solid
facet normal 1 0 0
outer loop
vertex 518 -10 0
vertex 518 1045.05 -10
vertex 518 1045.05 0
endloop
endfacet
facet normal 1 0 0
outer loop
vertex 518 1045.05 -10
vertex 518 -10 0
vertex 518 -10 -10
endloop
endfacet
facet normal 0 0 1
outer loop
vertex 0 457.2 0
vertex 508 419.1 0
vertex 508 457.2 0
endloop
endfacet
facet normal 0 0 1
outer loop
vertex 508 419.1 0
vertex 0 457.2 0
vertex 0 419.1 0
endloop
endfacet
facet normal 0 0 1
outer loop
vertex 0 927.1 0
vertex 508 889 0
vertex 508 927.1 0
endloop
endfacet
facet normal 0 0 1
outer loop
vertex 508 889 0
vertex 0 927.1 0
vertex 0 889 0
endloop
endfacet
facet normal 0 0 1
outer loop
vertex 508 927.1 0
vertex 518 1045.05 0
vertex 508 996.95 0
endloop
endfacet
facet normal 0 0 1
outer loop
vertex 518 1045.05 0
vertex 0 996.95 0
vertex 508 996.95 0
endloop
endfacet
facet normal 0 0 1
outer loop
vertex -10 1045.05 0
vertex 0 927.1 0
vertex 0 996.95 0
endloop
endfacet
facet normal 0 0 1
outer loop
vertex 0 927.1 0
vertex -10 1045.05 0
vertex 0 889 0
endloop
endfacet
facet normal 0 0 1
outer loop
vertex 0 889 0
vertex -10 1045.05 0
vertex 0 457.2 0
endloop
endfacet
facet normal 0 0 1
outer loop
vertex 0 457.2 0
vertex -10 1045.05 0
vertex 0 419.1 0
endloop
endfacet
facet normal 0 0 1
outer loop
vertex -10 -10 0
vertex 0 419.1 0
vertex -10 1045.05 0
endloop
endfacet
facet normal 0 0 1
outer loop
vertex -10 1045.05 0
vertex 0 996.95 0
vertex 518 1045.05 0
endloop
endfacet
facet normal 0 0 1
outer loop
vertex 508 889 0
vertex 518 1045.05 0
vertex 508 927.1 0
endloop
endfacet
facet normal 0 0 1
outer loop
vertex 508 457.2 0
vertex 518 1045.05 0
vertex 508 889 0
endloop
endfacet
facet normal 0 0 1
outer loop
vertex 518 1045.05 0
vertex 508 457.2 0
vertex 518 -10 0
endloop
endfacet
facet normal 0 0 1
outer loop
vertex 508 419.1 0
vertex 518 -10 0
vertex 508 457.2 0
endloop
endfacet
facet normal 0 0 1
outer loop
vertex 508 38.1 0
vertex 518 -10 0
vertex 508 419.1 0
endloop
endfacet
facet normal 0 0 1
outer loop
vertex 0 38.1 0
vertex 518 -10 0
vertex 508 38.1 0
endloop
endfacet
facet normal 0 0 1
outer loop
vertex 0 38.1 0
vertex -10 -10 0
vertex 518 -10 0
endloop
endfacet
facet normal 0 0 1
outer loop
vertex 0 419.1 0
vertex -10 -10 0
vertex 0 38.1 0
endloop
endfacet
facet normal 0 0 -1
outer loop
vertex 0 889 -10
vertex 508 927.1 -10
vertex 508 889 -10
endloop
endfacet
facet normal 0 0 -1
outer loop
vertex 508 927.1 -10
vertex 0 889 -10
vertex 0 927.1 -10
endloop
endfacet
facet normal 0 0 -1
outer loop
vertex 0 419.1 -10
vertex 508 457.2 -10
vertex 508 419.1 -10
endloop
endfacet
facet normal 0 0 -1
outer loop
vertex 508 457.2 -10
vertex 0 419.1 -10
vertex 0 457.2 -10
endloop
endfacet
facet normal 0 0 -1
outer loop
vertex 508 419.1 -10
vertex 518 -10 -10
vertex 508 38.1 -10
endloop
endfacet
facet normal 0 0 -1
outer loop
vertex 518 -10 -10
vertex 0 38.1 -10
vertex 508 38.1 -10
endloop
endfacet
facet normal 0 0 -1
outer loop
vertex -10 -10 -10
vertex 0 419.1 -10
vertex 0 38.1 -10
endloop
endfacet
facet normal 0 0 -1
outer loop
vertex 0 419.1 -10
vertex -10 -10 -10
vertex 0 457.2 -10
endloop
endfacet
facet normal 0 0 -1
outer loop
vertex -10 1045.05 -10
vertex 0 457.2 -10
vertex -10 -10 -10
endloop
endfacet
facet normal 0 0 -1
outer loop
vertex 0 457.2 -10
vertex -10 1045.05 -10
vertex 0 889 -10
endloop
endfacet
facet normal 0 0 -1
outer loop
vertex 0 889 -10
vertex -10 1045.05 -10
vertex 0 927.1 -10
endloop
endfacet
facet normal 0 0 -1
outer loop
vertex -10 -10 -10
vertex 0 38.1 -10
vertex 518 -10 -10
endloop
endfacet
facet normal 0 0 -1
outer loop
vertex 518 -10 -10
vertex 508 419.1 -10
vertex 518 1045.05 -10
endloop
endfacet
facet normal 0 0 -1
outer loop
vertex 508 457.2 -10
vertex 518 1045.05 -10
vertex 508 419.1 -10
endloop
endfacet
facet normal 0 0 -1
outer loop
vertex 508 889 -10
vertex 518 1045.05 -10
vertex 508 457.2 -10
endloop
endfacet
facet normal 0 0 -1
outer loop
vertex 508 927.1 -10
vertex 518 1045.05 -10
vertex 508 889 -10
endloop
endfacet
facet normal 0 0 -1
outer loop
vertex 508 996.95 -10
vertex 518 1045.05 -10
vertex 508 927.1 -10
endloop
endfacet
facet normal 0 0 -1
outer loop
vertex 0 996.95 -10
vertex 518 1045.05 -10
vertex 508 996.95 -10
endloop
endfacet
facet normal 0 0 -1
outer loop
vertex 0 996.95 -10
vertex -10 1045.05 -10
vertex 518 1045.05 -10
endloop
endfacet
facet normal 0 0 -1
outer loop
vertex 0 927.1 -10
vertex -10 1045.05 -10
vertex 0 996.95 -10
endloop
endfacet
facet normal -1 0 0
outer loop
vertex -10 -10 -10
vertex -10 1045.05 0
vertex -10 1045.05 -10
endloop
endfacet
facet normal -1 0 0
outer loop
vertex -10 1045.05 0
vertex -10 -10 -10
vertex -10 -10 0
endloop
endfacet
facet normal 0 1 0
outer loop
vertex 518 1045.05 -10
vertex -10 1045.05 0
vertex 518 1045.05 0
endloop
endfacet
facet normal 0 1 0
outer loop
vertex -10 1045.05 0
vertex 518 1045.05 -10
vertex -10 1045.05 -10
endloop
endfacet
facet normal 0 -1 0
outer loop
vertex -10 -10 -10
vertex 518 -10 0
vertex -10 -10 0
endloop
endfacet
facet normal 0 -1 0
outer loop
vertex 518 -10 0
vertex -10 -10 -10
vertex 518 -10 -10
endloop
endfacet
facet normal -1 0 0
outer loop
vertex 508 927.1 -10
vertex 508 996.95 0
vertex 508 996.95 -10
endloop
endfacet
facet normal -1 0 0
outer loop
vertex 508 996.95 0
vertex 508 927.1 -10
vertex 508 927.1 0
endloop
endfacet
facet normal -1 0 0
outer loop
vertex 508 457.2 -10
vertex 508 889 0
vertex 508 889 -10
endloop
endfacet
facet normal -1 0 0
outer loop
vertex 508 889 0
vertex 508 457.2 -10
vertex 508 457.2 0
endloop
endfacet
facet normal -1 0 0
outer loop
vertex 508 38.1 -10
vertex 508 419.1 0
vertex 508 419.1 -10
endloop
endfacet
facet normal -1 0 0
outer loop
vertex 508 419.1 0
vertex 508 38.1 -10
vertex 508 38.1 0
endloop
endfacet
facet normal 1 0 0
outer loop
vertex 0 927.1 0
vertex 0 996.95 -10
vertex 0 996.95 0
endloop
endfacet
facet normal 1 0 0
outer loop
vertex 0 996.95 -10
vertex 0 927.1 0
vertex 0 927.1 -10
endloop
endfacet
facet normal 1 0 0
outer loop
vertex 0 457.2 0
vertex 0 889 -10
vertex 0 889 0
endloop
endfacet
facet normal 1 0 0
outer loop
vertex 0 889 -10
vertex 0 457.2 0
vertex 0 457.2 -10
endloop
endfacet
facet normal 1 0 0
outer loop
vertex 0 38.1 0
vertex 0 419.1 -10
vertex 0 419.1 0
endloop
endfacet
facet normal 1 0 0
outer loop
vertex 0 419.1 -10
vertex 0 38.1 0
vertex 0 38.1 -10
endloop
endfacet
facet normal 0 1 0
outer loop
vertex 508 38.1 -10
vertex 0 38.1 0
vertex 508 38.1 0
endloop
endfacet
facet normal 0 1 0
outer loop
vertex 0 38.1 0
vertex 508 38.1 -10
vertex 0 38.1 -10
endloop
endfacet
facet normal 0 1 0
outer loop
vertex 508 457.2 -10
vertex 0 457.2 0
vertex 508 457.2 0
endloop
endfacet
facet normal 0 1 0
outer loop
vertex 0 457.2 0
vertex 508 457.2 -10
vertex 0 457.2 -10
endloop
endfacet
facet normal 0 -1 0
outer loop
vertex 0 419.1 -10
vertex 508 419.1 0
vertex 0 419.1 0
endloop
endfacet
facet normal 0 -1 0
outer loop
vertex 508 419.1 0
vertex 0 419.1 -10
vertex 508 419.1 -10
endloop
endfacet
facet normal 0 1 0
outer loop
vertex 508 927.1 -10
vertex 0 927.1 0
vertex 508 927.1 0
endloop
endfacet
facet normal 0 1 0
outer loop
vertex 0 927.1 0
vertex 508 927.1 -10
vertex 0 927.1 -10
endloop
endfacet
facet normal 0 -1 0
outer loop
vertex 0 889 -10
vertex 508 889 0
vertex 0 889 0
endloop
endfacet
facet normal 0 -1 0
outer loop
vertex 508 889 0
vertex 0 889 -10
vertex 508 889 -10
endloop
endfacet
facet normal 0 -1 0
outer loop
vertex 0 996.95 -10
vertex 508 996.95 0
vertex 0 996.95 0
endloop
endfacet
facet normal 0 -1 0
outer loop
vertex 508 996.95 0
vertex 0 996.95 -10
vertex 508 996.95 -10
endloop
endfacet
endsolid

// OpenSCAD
color(alpha = 1.0000000000, c = [0.8000000000, 0.5000000000, 0.2000000000]) {
	union() {
		translate(v = [-10, -10, -10]) {
			difference() {
				cube(size = [528.0000000000, 1055.0500000000, 10]);
				translate(v = [10, 10, -1]) {
					cube(size = [508.0000000000, 1035.0500000000, 12]);
				}
			}
		}
		translate(v = [0, 0, -10]) {
			cube(size = [508.0000000000, 38.1000000000, 10]);
		}
		translate(v = [0, 419.1000000000, -10]) {
			cube(size = [508.0000000000, 38.1000000000, 10]);
		}
		translate(v = [0, 889.0000000000, -10]) {
			cube(size = [508.0000000000, 38.1000000000, 10]);
		}
		translate(v = [0, 996.9500000000, -10]) {
			cube(size = [508.0000000000, 38.1000000000, 10]);
		}
	}
	union() {
		translate(v = [-10, -10, -10]) {
			difference() {
				cube(size = [528.0000000000, 1055.0500000000, 10]);
				translate(v = [10, 10, -1]) {
					cube(size = [508.0000000000, 1035.0500000000, 12]);
				}
			}
		}
		translate(v = [0, 0, -10]) {
			cube(size = [508.0000000000, 38.1000000000, 10]);
		}
		translate(v = [0, 419.1000000000, -10]) {
			cube(size = [508.0000000000, 38.1000000000, 10]);
		}
		translate(v = [0, 889.0000000000, -10]) {
			cube(size = [508.0000000000, 38.1000000000, 10]);
		}
		translate(v = [0, 996.9500000000, -10]) {
			cube(size = [508.0000000000, 38.1000000000, 10]);
		}
	}
}
